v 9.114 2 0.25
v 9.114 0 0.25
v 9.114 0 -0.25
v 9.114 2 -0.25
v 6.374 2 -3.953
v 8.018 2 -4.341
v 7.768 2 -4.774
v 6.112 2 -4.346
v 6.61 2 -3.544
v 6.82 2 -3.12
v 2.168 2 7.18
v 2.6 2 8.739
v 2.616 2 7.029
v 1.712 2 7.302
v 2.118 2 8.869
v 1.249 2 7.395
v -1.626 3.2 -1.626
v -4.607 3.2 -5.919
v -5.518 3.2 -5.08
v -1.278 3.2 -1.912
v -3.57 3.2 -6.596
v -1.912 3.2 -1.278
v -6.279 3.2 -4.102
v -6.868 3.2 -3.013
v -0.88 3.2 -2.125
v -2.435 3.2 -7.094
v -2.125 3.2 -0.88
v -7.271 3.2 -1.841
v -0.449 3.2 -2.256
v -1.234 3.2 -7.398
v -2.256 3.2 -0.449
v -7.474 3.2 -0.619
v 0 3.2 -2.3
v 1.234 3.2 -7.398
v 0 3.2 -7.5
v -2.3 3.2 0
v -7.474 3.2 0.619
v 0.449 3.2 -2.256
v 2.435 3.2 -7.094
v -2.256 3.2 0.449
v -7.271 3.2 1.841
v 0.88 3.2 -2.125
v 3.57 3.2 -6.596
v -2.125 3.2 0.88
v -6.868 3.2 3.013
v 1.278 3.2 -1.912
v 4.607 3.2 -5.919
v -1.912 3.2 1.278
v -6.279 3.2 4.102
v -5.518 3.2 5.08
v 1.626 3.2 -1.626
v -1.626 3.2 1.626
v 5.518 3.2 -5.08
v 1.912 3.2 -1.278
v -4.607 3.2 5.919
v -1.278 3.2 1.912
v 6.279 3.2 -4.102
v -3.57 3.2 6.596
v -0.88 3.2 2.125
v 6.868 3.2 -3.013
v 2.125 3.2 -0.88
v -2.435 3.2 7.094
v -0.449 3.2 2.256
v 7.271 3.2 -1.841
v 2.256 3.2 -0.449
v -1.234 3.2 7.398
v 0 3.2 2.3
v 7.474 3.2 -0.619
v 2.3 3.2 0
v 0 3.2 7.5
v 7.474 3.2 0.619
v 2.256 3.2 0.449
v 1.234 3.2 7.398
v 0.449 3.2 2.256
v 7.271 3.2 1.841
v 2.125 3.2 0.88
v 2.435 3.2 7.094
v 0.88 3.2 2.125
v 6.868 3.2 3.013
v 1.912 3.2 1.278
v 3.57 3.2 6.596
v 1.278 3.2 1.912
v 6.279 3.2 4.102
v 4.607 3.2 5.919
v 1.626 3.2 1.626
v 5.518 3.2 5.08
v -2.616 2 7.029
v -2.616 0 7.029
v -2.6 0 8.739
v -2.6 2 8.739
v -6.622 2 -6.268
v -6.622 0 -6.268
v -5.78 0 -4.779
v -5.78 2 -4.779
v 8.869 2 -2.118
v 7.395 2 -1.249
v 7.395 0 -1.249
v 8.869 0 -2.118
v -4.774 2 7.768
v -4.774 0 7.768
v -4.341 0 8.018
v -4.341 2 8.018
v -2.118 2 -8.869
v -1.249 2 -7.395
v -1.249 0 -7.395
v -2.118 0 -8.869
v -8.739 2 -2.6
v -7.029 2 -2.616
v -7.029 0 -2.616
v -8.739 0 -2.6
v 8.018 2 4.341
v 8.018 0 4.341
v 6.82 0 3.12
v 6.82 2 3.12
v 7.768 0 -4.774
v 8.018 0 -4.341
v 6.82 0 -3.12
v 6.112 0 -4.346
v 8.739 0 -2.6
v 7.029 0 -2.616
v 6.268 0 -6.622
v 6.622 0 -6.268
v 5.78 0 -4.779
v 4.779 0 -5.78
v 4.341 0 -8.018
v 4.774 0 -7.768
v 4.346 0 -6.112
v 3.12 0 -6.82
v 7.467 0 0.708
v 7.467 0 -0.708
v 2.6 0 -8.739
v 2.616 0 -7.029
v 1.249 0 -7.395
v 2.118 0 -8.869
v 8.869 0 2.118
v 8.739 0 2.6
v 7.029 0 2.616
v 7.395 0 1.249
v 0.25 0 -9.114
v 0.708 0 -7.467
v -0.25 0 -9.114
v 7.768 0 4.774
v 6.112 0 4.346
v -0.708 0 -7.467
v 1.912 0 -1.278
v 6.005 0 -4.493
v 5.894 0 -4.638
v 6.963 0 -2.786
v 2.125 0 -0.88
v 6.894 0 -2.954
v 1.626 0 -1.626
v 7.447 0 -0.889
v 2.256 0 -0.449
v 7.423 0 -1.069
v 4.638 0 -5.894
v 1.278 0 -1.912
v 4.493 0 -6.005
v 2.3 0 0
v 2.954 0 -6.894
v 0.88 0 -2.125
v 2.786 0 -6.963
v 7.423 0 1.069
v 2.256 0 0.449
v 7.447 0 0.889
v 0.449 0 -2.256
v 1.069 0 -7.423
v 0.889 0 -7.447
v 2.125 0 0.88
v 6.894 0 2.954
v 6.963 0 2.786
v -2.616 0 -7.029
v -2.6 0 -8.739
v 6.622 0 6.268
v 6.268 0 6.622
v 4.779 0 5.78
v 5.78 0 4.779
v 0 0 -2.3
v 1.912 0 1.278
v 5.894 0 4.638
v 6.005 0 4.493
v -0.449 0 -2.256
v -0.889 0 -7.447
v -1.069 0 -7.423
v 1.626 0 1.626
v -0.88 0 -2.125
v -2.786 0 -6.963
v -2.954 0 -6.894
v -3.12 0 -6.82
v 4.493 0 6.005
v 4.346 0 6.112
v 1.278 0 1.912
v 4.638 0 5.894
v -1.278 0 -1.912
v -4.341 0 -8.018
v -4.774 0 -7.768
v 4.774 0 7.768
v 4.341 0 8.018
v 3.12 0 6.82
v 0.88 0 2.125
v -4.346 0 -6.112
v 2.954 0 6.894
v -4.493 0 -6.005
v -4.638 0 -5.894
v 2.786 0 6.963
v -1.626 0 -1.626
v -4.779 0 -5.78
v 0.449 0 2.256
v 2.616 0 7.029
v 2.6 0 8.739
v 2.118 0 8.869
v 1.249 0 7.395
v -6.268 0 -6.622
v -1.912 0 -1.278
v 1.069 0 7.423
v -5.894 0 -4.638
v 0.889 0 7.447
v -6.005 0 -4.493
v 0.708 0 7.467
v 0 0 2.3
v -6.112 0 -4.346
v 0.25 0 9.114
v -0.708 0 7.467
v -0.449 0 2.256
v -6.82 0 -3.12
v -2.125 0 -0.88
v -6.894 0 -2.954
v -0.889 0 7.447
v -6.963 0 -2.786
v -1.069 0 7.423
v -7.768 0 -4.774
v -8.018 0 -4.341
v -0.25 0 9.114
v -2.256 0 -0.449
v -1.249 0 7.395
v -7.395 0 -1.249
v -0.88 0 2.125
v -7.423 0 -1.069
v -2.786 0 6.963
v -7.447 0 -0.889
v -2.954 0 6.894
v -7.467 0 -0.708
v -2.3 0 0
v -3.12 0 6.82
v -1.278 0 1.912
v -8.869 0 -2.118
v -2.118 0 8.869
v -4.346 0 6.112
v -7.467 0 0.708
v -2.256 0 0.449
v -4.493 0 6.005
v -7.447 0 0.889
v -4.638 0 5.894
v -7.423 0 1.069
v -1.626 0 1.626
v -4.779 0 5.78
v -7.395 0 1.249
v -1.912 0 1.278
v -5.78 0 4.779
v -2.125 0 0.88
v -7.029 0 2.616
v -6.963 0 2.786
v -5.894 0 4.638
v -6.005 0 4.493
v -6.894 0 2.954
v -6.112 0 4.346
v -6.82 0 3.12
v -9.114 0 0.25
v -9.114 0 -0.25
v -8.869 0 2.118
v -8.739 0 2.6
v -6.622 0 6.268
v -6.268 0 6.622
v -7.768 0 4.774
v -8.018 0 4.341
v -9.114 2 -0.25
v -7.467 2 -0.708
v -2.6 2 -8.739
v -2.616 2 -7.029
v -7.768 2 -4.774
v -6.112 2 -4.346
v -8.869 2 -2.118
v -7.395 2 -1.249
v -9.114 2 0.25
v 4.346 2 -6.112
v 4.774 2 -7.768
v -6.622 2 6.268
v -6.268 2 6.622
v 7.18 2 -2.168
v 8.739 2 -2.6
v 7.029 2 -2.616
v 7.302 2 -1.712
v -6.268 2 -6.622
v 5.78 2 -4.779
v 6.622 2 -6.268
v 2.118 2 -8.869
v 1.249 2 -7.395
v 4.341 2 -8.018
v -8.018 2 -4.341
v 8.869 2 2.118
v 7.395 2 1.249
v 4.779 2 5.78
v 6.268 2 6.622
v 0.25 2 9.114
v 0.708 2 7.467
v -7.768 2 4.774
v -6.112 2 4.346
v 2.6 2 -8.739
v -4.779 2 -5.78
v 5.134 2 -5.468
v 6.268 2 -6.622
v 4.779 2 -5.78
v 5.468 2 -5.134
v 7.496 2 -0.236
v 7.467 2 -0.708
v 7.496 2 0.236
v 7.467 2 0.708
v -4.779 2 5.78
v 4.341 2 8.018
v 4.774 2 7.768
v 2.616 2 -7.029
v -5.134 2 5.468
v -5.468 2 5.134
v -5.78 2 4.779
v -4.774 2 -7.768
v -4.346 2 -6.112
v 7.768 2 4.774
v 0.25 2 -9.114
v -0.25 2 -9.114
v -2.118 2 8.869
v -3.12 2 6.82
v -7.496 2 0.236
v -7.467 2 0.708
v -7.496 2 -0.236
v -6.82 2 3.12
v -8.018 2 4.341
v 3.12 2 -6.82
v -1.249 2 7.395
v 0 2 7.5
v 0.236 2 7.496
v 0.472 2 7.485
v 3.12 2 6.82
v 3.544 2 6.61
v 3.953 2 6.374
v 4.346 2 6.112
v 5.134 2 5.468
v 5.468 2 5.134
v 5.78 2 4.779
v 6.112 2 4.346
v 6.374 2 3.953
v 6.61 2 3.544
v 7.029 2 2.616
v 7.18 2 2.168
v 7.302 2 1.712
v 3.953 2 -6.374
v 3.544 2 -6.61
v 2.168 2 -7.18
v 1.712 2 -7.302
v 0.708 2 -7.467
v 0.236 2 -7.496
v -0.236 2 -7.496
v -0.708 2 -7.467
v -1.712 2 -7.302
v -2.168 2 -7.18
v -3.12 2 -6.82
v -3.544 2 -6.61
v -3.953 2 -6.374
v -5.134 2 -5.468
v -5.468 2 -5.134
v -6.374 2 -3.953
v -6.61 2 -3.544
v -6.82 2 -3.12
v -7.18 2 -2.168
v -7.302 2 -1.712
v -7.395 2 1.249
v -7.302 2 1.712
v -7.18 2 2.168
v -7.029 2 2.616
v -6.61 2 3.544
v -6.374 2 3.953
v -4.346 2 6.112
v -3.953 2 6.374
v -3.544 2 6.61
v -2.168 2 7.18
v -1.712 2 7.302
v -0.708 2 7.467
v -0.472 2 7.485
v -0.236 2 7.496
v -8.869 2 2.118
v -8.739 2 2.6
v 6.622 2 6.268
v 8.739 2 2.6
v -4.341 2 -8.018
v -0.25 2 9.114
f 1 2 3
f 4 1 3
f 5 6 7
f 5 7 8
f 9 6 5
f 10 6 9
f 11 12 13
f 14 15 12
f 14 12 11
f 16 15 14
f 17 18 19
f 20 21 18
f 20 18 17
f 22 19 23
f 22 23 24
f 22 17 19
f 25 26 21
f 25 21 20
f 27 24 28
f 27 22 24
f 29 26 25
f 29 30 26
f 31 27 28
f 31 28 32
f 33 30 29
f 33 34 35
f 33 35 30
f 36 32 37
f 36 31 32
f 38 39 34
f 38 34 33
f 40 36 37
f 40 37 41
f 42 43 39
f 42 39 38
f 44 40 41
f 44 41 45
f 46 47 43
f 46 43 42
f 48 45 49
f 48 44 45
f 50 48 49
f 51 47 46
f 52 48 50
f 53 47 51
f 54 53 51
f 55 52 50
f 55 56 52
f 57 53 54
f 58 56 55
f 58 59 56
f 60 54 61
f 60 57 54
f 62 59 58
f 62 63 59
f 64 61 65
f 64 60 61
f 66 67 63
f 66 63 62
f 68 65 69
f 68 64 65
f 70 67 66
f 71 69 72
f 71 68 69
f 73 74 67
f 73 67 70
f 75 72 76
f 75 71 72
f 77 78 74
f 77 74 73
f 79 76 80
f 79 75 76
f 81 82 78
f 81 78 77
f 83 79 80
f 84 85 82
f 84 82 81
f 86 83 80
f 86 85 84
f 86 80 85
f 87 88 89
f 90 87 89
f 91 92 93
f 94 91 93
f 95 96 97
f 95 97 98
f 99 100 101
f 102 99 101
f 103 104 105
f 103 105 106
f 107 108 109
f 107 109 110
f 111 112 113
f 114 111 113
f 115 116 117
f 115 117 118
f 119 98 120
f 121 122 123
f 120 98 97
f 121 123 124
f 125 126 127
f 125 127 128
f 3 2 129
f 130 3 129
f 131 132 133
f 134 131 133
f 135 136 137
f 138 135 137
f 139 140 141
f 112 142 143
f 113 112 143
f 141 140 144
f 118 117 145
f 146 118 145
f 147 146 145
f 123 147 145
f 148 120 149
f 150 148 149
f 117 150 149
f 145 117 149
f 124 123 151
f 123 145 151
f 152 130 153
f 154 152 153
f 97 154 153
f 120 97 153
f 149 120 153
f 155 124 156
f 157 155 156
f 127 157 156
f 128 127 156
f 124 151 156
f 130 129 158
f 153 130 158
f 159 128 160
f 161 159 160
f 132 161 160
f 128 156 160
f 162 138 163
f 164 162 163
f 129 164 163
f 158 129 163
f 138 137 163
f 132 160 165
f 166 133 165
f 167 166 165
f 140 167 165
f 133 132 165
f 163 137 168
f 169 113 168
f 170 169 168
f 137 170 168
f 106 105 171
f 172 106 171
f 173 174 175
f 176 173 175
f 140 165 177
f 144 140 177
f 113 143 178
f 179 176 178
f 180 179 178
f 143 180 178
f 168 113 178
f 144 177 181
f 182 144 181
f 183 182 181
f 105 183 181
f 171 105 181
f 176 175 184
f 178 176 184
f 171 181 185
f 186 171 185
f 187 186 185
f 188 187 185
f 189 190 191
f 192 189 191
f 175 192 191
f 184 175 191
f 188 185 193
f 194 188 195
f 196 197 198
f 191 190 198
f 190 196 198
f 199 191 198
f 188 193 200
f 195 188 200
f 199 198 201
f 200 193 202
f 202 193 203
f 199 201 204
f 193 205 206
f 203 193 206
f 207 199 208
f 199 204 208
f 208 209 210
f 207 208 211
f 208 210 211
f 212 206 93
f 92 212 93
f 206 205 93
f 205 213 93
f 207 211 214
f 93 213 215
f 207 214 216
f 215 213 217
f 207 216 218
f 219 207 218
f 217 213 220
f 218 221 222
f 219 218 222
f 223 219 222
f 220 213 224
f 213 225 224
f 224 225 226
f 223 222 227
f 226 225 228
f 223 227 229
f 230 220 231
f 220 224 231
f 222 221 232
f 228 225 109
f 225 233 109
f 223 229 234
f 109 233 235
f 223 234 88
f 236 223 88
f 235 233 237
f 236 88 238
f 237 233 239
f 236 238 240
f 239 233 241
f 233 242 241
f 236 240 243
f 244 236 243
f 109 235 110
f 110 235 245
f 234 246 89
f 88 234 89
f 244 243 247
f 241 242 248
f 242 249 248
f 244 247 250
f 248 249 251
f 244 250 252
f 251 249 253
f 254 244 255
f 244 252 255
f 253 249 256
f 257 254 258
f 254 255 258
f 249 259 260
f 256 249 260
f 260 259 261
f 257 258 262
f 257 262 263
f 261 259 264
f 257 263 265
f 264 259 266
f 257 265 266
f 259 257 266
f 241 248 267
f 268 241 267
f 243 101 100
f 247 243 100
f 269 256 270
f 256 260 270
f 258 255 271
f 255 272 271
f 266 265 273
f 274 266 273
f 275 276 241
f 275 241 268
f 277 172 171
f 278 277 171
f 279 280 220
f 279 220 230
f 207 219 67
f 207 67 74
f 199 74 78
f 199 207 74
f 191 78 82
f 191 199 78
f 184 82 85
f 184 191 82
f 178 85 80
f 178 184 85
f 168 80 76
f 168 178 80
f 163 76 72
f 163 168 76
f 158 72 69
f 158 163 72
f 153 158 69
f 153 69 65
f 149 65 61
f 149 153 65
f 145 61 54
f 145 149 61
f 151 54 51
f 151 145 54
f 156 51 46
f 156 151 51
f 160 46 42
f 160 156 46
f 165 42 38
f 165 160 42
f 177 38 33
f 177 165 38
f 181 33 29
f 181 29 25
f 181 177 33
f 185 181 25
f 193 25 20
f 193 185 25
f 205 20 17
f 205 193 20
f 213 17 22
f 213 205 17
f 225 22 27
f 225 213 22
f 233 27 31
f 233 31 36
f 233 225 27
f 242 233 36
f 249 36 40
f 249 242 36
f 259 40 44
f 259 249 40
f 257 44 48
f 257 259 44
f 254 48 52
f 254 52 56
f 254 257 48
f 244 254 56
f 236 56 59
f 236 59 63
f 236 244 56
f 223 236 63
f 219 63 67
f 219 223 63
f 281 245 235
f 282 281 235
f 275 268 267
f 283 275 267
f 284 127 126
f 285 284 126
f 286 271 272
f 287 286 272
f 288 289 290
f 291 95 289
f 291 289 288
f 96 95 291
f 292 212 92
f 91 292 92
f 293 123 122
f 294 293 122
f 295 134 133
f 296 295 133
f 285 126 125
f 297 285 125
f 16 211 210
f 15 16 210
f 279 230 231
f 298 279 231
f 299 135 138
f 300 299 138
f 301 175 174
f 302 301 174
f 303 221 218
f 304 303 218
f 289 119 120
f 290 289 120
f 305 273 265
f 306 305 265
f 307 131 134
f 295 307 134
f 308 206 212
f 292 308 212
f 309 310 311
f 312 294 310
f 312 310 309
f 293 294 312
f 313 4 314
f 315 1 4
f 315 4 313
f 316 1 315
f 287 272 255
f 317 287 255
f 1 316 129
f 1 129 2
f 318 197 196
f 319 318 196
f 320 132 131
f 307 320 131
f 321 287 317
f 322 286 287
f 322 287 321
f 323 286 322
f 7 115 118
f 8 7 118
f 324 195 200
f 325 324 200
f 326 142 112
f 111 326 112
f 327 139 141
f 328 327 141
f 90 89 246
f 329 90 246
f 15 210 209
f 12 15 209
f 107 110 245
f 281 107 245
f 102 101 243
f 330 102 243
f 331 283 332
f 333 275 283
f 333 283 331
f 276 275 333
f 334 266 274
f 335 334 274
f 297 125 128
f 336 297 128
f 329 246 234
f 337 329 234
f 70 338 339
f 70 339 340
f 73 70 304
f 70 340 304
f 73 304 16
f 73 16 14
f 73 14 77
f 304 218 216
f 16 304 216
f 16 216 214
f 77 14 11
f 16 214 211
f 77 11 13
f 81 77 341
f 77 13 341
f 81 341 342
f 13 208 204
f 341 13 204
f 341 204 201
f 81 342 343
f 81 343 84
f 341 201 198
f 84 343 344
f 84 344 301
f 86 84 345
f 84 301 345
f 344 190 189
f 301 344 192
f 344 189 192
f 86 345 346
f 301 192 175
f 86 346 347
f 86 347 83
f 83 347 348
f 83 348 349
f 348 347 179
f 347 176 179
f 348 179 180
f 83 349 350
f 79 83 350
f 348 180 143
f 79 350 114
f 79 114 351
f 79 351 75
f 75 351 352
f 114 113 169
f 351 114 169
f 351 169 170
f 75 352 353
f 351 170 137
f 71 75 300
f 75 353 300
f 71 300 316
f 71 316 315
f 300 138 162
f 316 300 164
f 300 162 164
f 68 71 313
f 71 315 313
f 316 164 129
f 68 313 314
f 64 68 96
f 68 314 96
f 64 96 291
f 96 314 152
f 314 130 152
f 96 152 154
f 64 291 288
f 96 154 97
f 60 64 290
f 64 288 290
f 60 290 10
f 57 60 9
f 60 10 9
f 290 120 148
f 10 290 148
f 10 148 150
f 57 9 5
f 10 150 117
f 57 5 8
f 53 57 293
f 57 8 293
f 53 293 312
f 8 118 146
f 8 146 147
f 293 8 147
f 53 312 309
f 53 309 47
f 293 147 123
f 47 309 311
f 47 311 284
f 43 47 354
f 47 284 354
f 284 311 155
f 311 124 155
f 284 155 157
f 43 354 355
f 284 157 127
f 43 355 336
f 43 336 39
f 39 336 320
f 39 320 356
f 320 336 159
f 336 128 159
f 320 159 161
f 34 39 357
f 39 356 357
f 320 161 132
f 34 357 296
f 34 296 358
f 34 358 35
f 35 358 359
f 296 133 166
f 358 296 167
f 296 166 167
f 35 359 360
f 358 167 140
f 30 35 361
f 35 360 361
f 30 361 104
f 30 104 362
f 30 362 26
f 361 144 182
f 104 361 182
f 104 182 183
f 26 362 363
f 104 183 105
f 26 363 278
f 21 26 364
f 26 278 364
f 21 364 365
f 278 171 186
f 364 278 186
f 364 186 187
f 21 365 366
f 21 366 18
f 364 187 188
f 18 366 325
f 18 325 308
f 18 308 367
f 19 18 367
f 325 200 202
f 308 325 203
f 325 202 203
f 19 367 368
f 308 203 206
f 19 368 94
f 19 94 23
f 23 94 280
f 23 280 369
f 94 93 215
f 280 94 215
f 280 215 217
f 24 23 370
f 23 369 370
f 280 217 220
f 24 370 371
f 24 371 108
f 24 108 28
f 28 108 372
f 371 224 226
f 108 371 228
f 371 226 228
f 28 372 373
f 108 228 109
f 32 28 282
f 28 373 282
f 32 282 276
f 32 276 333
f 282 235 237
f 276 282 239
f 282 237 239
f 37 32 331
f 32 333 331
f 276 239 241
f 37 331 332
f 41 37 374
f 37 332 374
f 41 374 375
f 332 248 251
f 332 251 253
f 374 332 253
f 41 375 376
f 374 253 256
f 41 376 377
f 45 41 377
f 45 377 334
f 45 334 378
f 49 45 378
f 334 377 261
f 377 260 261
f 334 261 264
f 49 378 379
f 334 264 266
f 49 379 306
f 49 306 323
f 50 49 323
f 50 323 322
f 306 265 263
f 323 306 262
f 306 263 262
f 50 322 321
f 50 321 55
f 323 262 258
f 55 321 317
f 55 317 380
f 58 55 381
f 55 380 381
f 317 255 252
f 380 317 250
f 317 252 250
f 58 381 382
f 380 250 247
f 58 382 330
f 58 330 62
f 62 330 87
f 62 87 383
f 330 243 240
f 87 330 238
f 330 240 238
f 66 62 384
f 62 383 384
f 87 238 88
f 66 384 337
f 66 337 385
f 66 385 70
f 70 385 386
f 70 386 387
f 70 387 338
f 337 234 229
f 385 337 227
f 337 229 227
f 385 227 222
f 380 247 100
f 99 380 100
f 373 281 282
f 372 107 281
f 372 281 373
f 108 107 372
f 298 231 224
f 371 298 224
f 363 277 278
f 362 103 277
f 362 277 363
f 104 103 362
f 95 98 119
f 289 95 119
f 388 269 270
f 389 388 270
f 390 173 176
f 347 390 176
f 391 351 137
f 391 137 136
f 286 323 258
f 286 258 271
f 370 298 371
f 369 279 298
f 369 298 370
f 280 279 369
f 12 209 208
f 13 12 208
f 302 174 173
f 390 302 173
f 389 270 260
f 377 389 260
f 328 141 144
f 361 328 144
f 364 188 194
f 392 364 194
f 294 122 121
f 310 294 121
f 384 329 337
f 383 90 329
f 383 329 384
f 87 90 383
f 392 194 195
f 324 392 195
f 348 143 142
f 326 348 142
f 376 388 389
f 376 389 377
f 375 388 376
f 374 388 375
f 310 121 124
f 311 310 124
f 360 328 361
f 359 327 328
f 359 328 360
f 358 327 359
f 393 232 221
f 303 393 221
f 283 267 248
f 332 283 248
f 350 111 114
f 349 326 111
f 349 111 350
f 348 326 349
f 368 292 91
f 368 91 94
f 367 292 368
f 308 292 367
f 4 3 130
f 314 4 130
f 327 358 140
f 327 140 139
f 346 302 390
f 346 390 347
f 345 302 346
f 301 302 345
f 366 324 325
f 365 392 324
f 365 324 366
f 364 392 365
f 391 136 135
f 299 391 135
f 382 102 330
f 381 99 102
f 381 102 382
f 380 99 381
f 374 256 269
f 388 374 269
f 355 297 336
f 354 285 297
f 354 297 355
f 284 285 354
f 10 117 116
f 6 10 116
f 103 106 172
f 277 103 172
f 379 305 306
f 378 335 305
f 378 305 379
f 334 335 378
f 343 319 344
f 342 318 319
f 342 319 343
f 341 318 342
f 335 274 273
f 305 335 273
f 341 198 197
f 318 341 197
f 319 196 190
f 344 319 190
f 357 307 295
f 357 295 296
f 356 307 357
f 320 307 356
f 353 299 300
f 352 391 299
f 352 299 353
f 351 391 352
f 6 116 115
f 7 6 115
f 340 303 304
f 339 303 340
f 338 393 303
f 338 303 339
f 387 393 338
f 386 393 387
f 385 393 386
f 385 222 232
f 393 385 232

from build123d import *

# Parameters (mm, degrees)
SKETCH1_R           = 7.5
SKETCH1_R_2         = 2.3
BOSS_EXTRUDE1_DEPTH = 3.2
BOSS_EXTRUDE2_DEPTH = 2
CIRPATTERN1_COUNT   = 24


with BuildPart() as part:
    # Sketch1 → Boss-Extrude1 (new body)
    with BuildSketch(Plane(origin=(0, 0, 0), x_dir=(1, 0, 0), z_dir=(0, 1, 0))):
        with Locations(Location((0, 0, 0), (0, 0, 270))):
            Circle(SKETCH1_R)
        with Locations(Location((0, 0, 0), (0, 0, 270))):
            Circle(SKETCH1_R_2, mode=Mode.SUBTRACT)
    extrude(amount=BOSS_EXTRUDE1_DEPTH)

    # Sketch2 → Boss-Extrude2 (add)
    with BuildSketch(Plane.XZ):
        Polygon((9.114493261, 0.25), (9.114493261, -0.25), (7.314493261, -0.75), (7.314493261, 0.75), align=None)
    boss_extrude2 = extrude(amount=-BOSS_EXTRUDE2_DEPTH)

    # CirPattern1: Boss-Extrude2 ×24 about axis
    cirpattern1_axis = Axis((0, 0, 0), (0, 1, 0))
    for i in range(1, CIRPATTERN1_COUNT):
        add(boss_extrude2.rotate(cirpattern1_axis, i * 360 / CIRPATTERN1_COUNT))


solid = part.part
